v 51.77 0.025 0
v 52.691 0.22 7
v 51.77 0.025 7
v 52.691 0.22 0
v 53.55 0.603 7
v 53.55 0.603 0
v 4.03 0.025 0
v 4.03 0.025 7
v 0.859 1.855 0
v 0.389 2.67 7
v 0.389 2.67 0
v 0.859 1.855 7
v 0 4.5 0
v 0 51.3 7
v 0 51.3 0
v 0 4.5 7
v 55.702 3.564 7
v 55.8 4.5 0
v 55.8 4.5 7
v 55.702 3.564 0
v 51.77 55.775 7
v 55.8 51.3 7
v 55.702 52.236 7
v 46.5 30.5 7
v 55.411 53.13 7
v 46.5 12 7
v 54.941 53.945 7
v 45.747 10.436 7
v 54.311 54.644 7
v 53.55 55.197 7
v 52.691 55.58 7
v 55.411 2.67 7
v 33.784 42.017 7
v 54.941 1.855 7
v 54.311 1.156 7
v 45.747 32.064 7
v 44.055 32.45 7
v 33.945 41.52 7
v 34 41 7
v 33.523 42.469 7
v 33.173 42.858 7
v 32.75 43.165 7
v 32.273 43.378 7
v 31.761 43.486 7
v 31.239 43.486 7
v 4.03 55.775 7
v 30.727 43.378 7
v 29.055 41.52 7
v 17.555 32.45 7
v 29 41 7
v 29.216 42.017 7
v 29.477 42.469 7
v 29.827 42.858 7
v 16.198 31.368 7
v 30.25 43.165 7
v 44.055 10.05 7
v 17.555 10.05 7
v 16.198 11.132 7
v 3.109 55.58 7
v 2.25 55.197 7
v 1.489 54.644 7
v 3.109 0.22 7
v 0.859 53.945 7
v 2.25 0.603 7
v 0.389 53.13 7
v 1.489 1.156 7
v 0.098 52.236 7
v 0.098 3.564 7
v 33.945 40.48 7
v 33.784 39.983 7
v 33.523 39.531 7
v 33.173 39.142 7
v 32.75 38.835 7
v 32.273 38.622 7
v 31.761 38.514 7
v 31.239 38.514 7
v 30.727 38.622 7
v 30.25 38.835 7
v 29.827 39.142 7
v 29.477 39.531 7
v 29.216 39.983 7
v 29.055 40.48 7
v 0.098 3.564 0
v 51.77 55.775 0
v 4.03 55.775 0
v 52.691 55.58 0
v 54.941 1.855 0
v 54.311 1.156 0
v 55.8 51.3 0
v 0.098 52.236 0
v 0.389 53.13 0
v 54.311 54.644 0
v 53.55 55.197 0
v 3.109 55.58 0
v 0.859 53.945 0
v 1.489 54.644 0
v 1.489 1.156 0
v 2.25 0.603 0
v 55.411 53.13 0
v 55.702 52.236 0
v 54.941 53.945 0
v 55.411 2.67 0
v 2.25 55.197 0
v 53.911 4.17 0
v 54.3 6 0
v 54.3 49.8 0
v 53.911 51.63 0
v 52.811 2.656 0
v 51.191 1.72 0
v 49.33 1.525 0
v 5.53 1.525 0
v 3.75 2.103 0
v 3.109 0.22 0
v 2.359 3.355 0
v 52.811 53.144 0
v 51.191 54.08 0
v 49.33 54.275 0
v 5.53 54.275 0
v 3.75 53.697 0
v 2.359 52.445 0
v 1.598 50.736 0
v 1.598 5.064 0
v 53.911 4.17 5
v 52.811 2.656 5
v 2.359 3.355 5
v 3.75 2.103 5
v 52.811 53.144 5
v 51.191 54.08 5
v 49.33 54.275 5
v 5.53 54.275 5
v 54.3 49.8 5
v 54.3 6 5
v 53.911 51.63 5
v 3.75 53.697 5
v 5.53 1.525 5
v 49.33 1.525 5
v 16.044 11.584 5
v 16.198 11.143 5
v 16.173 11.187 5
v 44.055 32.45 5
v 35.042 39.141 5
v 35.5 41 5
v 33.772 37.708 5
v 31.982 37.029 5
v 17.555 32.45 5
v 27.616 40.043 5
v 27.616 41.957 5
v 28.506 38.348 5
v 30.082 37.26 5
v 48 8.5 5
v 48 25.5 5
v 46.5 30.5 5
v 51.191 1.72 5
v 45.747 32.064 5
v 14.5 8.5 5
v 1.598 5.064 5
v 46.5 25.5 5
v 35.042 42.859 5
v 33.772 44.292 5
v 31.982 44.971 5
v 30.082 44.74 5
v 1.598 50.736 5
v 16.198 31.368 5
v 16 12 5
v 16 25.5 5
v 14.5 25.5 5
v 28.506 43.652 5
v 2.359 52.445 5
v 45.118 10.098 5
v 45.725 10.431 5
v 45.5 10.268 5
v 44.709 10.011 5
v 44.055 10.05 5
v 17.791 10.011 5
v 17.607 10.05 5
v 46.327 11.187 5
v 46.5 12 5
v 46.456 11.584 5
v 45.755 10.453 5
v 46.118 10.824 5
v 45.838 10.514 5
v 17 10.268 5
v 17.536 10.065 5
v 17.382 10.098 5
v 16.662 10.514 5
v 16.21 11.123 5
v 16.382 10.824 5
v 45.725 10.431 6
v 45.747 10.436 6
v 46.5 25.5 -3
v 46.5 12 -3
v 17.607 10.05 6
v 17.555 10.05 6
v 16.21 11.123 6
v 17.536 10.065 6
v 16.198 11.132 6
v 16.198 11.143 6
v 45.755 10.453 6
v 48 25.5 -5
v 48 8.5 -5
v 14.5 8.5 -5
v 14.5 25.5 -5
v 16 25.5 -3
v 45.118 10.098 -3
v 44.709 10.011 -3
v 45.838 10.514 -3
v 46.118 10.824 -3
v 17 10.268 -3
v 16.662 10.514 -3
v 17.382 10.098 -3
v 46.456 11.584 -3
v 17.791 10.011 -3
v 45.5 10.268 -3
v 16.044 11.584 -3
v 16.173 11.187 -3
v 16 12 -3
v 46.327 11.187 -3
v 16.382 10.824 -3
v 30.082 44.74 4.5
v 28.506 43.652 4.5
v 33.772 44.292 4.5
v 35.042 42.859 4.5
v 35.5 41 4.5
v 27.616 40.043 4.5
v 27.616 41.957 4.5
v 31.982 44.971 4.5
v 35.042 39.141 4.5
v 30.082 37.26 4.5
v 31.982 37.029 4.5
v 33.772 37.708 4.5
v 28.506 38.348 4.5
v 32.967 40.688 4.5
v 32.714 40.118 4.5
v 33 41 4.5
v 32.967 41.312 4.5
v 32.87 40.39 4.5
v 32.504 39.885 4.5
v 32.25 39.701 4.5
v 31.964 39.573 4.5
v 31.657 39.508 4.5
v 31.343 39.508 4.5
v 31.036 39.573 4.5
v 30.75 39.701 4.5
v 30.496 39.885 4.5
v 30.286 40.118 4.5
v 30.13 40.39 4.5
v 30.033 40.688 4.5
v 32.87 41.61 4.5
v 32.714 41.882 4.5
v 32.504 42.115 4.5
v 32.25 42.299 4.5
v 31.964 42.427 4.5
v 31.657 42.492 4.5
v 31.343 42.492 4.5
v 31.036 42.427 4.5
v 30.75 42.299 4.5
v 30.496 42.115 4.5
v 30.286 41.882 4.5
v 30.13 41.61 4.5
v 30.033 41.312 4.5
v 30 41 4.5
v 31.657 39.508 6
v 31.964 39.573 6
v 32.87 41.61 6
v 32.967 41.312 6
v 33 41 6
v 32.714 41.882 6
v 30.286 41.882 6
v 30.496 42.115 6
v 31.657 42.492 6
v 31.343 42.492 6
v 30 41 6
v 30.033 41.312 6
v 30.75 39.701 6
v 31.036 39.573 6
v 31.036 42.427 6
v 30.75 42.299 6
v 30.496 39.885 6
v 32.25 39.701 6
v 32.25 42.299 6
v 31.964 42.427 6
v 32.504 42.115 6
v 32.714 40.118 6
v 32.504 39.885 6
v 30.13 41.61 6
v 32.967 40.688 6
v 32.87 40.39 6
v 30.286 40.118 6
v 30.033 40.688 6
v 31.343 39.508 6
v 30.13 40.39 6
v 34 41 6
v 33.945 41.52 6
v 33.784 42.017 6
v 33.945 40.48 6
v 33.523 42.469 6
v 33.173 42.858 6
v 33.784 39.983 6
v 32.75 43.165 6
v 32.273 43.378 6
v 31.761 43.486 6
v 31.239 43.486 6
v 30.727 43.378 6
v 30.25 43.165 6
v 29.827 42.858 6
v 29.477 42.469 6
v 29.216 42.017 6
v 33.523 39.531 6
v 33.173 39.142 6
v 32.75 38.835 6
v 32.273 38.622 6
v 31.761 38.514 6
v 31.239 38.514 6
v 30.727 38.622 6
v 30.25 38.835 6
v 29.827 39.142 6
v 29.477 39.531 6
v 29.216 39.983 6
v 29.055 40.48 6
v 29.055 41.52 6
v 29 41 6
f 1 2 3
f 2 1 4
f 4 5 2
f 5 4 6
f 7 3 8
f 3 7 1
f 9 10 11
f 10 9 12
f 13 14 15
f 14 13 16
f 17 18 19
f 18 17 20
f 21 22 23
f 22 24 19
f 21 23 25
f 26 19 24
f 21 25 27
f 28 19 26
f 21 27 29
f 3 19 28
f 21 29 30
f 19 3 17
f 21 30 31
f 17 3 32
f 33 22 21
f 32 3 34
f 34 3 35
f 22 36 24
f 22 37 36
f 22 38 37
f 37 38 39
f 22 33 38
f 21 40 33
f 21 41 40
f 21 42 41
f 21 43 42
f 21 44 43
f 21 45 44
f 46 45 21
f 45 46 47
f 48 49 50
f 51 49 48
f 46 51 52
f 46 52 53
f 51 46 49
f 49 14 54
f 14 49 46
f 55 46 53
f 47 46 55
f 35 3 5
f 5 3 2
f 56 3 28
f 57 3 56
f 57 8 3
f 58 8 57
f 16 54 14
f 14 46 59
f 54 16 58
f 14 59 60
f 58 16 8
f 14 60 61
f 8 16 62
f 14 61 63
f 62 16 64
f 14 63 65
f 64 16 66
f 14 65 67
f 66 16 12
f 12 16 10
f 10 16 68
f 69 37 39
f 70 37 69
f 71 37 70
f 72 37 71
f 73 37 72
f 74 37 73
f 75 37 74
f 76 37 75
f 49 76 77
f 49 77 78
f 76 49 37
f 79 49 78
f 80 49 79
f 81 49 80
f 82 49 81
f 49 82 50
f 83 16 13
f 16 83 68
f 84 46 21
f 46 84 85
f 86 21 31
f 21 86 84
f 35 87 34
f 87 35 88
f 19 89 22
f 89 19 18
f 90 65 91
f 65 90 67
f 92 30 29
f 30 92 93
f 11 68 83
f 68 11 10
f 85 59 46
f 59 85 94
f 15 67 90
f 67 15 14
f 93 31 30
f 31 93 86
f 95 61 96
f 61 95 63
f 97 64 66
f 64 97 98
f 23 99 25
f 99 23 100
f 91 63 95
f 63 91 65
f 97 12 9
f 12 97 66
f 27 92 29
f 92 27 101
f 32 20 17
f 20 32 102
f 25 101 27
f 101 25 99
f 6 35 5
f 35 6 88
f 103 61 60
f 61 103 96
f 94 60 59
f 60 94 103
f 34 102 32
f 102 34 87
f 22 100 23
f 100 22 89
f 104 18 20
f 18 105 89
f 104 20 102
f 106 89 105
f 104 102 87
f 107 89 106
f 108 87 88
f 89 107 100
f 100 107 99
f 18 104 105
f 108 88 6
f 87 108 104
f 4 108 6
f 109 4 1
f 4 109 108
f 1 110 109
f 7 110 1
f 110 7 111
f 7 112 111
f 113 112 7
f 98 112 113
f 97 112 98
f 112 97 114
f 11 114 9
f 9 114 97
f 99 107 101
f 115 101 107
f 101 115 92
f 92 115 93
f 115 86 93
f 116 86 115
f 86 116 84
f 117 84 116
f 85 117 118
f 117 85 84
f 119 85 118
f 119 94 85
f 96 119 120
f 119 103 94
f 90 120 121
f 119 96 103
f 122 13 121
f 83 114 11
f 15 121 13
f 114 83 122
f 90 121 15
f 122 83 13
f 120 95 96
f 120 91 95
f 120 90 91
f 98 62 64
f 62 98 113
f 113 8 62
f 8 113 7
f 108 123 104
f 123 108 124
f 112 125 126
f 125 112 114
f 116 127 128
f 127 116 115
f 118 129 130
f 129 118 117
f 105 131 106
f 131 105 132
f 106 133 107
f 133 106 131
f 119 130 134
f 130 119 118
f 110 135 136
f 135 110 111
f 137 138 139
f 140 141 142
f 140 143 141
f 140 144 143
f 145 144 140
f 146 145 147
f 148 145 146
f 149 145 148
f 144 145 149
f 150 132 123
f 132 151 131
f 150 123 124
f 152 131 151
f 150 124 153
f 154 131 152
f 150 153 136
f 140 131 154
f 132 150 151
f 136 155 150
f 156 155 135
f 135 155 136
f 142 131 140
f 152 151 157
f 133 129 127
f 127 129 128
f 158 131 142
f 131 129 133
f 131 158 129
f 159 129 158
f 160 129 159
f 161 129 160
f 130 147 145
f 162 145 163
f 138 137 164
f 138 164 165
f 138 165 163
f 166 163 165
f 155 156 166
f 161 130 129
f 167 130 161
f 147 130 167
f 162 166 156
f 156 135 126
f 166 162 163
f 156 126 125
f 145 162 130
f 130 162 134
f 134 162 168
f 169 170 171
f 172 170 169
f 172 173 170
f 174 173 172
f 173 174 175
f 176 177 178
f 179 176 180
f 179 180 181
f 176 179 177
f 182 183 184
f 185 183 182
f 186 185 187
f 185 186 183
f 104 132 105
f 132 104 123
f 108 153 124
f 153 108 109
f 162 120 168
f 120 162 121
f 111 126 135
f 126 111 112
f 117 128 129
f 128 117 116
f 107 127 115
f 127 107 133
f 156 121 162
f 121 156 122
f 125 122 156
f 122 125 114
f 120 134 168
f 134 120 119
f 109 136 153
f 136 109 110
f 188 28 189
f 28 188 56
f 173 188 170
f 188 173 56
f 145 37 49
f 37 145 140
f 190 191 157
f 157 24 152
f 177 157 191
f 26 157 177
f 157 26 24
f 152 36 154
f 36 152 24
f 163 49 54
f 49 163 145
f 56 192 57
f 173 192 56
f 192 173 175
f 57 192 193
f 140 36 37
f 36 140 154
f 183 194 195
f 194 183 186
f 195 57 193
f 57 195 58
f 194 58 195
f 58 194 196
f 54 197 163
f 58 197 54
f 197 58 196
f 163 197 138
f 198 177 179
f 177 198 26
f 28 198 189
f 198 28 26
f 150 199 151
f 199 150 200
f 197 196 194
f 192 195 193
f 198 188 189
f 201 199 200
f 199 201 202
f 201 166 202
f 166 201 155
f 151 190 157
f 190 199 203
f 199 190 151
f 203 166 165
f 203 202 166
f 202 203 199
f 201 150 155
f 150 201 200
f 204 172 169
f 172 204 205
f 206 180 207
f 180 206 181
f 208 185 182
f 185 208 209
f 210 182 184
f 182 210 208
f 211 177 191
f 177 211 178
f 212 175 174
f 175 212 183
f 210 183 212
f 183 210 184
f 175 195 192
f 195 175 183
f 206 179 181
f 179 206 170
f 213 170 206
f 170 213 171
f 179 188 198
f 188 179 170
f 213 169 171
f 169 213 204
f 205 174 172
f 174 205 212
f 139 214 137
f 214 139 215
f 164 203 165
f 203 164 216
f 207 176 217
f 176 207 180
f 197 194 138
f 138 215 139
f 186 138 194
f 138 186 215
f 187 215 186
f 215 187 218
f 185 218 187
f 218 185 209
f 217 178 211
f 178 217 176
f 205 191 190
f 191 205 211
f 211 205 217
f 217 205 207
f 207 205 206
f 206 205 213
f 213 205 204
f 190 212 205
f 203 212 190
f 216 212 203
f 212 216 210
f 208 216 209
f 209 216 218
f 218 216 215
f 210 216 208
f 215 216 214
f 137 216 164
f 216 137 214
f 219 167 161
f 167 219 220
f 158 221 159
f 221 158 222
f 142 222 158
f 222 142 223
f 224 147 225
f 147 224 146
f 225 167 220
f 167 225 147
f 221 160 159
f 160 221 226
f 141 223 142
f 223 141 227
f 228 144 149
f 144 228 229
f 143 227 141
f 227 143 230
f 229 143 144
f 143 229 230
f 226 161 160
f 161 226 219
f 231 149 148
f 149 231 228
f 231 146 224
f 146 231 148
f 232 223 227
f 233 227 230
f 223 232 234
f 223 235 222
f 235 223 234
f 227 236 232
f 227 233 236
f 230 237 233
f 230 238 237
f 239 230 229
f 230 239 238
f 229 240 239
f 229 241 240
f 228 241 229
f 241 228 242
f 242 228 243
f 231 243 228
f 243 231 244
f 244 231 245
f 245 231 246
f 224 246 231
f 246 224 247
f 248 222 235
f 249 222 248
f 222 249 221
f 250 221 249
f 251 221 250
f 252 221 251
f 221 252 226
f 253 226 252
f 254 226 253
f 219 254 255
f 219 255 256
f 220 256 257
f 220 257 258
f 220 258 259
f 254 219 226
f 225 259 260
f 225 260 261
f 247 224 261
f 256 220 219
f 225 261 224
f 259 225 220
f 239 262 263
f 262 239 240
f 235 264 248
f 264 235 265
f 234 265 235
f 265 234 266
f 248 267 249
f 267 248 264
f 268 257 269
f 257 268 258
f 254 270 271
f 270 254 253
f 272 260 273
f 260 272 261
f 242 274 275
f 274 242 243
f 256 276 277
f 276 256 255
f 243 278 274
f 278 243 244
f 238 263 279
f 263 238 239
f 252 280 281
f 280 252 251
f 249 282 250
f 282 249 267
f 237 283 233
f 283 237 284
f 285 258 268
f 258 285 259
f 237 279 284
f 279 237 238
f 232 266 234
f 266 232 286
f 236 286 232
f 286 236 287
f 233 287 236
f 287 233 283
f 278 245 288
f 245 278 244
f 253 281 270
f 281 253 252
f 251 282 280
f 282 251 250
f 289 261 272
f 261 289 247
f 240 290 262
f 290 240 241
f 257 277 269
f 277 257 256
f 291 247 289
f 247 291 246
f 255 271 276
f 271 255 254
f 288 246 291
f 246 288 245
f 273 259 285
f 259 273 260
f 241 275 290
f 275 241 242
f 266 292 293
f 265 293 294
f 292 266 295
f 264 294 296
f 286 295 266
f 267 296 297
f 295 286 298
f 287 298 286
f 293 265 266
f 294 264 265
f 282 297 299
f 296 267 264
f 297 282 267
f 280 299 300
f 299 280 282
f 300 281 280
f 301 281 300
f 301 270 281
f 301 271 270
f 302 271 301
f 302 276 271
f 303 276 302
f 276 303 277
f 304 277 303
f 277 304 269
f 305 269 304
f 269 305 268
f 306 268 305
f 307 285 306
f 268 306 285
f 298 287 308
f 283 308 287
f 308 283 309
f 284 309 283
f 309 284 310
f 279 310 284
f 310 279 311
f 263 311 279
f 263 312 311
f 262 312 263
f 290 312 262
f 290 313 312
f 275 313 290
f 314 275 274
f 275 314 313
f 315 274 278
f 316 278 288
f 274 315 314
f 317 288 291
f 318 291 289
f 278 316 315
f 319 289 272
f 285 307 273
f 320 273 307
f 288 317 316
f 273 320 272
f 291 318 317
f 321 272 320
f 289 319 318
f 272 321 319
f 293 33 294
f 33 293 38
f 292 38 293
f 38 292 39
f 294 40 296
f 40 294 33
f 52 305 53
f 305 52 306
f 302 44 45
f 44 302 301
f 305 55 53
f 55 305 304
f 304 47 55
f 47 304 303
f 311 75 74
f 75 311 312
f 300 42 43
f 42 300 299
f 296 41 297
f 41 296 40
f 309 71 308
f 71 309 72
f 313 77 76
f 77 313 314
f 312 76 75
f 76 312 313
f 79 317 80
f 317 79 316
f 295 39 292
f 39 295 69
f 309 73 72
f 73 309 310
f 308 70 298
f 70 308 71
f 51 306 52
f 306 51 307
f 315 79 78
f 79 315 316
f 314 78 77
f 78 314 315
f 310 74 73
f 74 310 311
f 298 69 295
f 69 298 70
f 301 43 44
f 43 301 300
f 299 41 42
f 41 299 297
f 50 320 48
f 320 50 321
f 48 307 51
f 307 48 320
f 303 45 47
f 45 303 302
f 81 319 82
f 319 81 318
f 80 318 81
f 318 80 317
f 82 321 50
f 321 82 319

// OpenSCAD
width=55.8;
thickness=1.5;
radius=4.5;
height=7;
//height=2;
/* [Opening] */
hole_width=30.5;
full_open=14;
hole_height=8.5+full_open;
hole_radius=2;
hole_depth=12;
//hole_depth=0;
/* [Drill Hole] */
drill_hole_x=31.5;
drill_hole_y=41;
drill_hole_d=3;
drill_hole_sink_d=5;
drill_hole_sink_depth=1;

difference(){
    union(){
        translate([drill_hole_x,drill_hole_y,height-drill_hole_sink_depth-thickness]){
            cylinder(h=thickness, d=drill_hole_sink_d+2*thickness);
        }
        difference() {
            translate([radius, radius, 0]){
                minkowski() {
                    cube([width-2*radius,width-2*radius,height-1]);
                    cylinder(r=radius,h=1,$fn=30);
                }
            }
            translate([thickness+radius,thickness+radius,0]) {
                side = width-2*radius-(2*thickness);
                minkowski() {
                    cube([side,side,height-2-1]);
                    cylinder(r=radius,h=1);
                }
            }
            translate([16+hole_radius, 10+hole_radius, 0]){
                minkowski() {
                    cube([hole_width-2*hole_radius,hole_height-2*hole_radius,height-1]);
                    cylinder(r=hole_radius,h=1);
                }
            }
            
        }
        translate([16-thickness, 10-thickness, height-hole_depth]){
            difference() {
                cube([hole_width+2*thickness,full_open+2*thickness,hole_depth-1]);
                translate([thickness+hole_radius,thickness+hole_radius,+2]) {
                    width = hole_width-2*hole_radius;
                    height = width-2*hole_radius;
                    minkowski() {
                        cube([width,height,hole_depth-2-1]);
                        cylinder(r=hole_radius,h=1,$fn=30);
                    }
                }
            }
        }
    }
    translate([drill_hole_x,drill_hole_y,-thickness]){
        cylinder(h=height+thickness, d=drill_hole_d,$fn=30);
    }
    translate([drill_hole_x,drill_hole_y,height-drill_hole_sink_depth]){
        cylinder(h=drill_hole_sink_depth, d=drill_hole_sink_d, $fn=30);
    }
}
